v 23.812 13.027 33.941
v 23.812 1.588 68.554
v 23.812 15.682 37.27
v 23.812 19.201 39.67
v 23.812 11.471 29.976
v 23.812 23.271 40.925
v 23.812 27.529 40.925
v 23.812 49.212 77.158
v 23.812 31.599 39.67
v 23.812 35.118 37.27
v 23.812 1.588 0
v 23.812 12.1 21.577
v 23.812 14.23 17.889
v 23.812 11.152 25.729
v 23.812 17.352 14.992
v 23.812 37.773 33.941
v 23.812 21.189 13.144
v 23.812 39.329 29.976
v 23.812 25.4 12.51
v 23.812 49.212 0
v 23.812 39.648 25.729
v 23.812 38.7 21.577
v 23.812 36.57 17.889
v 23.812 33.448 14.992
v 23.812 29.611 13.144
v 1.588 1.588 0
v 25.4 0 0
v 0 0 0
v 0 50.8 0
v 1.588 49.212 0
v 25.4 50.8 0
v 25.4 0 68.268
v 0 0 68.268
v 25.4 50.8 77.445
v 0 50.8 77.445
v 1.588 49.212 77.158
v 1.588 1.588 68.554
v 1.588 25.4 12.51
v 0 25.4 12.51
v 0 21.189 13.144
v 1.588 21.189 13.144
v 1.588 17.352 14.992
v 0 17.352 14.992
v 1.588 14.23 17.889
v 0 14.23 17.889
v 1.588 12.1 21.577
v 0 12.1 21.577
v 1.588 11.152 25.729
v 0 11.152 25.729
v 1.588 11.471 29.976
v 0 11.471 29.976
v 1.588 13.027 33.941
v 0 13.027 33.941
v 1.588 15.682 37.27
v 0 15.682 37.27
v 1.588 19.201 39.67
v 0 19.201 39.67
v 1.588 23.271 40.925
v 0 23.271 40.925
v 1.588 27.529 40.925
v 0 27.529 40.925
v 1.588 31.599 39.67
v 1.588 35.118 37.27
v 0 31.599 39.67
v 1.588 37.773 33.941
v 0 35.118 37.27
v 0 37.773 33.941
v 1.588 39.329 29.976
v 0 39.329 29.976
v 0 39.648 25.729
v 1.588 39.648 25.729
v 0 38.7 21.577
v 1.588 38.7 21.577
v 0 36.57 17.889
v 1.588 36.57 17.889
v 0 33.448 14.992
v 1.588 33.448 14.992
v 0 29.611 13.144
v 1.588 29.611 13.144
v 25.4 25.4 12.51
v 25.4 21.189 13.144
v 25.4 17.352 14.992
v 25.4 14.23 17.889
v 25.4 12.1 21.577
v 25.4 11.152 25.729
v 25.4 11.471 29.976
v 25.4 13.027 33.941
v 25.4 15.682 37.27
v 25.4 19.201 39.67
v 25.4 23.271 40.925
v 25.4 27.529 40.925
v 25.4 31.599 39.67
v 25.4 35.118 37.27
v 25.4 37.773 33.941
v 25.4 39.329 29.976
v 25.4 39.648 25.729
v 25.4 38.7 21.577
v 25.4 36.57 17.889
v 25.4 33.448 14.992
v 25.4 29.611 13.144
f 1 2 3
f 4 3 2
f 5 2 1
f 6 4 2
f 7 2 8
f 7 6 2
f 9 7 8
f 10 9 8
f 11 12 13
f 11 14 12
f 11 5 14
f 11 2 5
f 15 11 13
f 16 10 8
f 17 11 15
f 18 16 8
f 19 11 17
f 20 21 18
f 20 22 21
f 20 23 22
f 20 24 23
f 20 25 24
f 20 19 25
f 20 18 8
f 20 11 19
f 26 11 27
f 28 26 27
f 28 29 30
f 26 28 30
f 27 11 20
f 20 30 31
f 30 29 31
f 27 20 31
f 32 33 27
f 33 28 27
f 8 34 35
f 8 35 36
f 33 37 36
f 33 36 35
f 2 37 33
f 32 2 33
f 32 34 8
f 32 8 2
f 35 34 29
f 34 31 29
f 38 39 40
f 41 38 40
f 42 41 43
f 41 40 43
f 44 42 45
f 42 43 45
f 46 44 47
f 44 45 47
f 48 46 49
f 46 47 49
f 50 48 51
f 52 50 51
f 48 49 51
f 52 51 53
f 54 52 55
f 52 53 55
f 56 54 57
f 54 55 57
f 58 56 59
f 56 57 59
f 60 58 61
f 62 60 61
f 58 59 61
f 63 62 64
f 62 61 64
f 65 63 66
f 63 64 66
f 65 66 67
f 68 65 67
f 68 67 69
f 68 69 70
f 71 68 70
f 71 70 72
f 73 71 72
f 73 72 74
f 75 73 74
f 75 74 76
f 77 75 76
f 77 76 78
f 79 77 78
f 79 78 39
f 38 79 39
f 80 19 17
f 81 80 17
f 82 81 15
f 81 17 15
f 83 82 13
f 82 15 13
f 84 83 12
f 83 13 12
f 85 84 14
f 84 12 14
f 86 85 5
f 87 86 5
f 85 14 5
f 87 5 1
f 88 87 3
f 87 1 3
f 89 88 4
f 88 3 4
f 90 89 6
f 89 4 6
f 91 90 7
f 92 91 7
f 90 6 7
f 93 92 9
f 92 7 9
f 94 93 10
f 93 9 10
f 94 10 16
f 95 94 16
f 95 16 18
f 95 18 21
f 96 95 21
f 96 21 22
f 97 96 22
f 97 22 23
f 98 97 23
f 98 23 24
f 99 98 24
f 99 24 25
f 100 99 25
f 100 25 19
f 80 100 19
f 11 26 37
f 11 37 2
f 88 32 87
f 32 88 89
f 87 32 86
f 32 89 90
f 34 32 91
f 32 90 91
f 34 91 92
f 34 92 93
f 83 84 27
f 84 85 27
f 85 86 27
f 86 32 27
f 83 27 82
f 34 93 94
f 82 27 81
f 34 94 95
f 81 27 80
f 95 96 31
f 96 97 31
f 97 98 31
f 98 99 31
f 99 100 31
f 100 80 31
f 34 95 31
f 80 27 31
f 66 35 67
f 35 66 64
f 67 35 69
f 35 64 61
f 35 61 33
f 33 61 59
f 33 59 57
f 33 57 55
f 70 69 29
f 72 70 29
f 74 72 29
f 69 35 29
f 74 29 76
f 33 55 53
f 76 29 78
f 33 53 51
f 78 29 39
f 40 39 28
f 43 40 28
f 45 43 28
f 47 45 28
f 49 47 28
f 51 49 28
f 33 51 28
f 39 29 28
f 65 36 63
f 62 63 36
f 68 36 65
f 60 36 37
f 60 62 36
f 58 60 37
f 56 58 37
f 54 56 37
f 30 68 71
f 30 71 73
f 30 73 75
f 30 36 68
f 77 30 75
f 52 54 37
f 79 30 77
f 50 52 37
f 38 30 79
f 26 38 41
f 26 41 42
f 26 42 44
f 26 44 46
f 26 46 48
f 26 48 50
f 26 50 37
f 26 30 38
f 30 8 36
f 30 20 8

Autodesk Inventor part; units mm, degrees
ref_plane "YZ Plane" through (0, 0, 0) normal (1, 0, 0) x (0, 1, 0)
ref_plane "XZ Plane" through (0, 0, 0) normal (0, 1, 0) x (-1, 0, 0)
ref_plane "XY Plane" through (0, 0, 0) normal (0, 0, 1) x (1, 0, 0)
sketch "Sketch1" plane through (0, 0, 0) normal (0, 0, 1) x (1, 0, 0)
  line L0 (0, 0) -> (25.4, 0)
  line L1 (25.4, 0) -> (25.4, 50.8)
  line L2 (25.4, 50.8) -> (0, 50.8)
  line L3 (0, 50.8) -> (0, 0)
  line L4 (1.5875, 1.5875) -> (23.8125, 1.5875)
  line L5 (23.8125, 1.5875) -> (23.8125, 49.2125)
  line L6 (23.8125, 49.2125) -> (1.5875, 49.2125)
  line L7 (1.5875, 49.2125) -> (1.5875, 1.5875)
  dimension "d0" = 25.4
  dimension "d1" = 50.8
  dimension "d2" = 1.5875
extrude "Extrusion1" add sketch "Sketch1" along normal blind 77.4446
sketch "Sketch2" plane through (25.4, 0, 0) normal (1, 0, 0) x (0, 0, -1)
  line L0 (0, 50.8) -> (-77.4446, 50.8) projected
  line L1 (-77.4446, 50.8) -> (-68.2676, 0)
  line L2 (-68.2676, 0) -> (-77.4446, 0)
  line L3 (0, 1.5875) -> (-77.4446, 1.5875) projected
  line L4 (-77.4446, 50.8) -> (-77.4446, 0) projected
  line L5 (-77.4446, 0) -> (-77.4446, 50.8)
  point P0 (0, 0)
  dimension "d5" = 10.24
sketch "Sketch3" plane through (25.4, 0, 0) normal (1, 0, 0) x (0, 0, -1)
  line L0 (0, 0) -> (0, 50.8) projected
  line L1 (0, 50.8) -> (-77.4446, 50.8) projected
  line L2 (-77.4446, 0) -> (-77.4446, 50.8) projected
  point P0 (-26.797, 25.4)
  dimension "d10" = 25.4
  dimension "d21" = 50.6476
hole "Hole1" at (25.4, 25.4, 26.797) direction (-1, 0, 0) diameter 28.575 depth 25.4 tip angle 118
extrude "Extrusion3" cut sketch "Sketch2" against normal blind 25.4
properties part number "ARM_029_BottomIntakeSide" material "Aluminum 6061"
